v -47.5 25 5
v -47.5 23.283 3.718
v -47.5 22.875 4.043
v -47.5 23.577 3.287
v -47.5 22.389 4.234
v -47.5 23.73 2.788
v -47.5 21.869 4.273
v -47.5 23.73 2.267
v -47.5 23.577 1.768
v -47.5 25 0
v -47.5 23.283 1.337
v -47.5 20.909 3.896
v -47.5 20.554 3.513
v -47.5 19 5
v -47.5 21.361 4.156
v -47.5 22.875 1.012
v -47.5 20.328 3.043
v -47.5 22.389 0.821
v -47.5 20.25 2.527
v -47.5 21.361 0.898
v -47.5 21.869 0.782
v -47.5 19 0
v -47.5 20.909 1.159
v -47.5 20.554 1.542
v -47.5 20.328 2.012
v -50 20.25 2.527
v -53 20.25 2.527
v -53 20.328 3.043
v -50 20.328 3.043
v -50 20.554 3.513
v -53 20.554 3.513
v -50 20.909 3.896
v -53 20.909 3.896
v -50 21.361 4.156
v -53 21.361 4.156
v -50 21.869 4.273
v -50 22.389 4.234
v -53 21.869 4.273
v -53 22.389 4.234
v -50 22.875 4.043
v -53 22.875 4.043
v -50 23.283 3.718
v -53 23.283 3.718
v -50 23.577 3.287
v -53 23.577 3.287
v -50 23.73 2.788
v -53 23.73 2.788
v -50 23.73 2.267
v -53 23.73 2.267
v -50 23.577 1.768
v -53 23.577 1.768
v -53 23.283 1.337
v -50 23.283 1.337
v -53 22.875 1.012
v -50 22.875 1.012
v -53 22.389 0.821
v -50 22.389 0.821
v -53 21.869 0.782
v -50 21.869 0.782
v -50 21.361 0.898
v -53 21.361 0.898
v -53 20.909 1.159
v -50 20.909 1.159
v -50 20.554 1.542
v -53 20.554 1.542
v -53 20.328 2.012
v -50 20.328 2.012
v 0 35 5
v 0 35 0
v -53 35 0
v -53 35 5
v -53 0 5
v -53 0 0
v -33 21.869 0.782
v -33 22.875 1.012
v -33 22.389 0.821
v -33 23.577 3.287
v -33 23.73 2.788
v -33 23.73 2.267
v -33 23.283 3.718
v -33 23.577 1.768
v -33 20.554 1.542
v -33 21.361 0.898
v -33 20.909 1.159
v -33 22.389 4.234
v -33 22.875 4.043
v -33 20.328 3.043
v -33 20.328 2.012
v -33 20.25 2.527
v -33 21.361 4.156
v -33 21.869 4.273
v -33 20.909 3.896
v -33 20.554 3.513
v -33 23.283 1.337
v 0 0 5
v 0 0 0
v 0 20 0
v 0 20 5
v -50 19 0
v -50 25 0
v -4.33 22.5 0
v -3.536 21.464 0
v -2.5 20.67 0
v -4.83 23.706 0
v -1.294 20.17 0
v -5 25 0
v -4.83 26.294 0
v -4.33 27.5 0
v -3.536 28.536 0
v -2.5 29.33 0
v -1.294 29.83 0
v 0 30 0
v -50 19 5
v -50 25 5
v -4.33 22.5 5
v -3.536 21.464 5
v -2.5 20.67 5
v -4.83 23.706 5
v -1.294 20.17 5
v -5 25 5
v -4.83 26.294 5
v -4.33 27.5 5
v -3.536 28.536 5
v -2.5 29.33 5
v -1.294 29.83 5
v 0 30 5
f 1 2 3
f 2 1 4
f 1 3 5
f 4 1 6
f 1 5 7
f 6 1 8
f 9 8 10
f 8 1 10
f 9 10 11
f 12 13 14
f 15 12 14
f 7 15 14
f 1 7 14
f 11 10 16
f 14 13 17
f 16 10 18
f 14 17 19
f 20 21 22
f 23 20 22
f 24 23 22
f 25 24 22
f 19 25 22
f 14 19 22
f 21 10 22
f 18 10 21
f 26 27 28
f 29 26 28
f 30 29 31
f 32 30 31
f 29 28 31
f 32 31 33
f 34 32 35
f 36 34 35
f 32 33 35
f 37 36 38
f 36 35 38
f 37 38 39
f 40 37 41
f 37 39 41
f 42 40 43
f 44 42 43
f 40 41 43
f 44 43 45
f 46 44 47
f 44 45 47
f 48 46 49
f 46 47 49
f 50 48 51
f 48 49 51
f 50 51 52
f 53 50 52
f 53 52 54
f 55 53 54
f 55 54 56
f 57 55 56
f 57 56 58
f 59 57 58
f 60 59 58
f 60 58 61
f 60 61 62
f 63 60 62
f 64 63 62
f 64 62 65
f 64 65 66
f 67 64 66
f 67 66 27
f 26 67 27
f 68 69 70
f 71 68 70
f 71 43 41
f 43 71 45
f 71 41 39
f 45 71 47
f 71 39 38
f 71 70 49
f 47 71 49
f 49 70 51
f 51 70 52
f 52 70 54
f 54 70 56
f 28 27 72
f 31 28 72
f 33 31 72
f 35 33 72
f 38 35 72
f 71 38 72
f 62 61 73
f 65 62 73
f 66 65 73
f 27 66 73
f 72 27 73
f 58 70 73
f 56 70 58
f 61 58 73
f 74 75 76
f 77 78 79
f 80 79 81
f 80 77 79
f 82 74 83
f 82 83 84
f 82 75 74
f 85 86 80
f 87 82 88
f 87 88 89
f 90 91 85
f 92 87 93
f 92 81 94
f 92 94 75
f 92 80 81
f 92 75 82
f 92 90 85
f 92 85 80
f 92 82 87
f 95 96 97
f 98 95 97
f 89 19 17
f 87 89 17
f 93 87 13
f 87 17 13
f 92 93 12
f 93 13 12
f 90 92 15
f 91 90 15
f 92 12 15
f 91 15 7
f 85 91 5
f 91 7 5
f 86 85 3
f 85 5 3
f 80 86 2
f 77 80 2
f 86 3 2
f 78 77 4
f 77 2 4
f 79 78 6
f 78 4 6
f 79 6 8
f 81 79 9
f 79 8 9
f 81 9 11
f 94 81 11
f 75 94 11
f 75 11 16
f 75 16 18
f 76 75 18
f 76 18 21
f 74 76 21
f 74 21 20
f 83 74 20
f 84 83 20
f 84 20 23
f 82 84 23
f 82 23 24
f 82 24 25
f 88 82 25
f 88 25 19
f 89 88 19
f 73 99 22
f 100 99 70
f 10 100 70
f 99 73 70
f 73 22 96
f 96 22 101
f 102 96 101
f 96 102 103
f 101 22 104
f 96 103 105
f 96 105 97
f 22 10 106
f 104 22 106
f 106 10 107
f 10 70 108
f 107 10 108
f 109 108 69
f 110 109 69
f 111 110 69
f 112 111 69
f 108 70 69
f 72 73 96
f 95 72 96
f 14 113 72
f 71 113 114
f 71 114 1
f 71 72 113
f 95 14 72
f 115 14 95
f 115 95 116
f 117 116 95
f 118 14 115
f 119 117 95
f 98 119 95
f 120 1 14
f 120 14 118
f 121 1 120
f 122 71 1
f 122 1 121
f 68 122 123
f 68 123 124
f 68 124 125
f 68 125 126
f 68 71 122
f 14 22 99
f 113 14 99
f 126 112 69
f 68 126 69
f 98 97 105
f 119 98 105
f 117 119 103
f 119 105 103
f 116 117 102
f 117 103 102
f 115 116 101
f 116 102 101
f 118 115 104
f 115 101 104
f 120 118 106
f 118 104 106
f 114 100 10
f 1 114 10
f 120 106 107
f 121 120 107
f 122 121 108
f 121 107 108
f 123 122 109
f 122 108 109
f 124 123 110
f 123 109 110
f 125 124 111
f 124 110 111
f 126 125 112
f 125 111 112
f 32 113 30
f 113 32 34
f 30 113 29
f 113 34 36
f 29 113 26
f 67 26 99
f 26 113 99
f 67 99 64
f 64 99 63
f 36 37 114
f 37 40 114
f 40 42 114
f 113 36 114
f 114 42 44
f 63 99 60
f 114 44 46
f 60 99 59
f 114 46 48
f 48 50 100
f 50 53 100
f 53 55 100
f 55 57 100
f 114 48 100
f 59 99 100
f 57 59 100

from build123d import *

# Parameters (mm, degrees)
F0_W     = 3
F0_H     = 10
F0_H_2   = 3
F1_DEPTH = 5
F2_R     = 1.75
F3_DEPTH = 20
F4_DEPTH = 20


# Not quite as in the source:
# - a feature names something its author has since deleted; it is built from what else it names


with BuildPart() as f1:
    # F0 (on Top) → F1 (new body)
    with BuildSketch(Plane.XY):
        with BuildLine():
            Line((-5, 25), (-47.5, 25))
            Line((-47.5, 25), (-47.5, 22))
            Line((-47.5, 22), (-47.5, 19))
            Line((-47.5, 19), (-50, 19))
            Line((-50, 19), (-50, 0))
            Line((-50, 0), (0, 0))
            Line((0, 0), (0, 20))
            ThreePointArc((0, 20), (-3.5355339059, 21.4644660941), (-5, 25))
        make_face()
        Polygon((-50, 22), (-53, 22), (-53, 0), (-50, 0), (-50, 19), align=None)
        with Locations((-51.5, 30)):
            Rectangle(F0_W, F0_H)
        with Locations((-51.5, 23.5)):
            Rectangle(F0_W, F0_H_2)
        with BuildLine():
            Line((0, 35), (-50, 35))
            Line((-50, 35), (-50, 25))
            Line((-50, 25), (-47.5, 25))
            Line((-47.5, 25), (-5, 25))
            ThreePointArc((-5, 25), (-3.5355339059, 28.5355339059), (0, 30))
            Line((0, 30), (0, 35))
        make_face()
    extrude(amount=F1_DEPTH)

    # F2 (on face) → F3 (cut)
    with BuildSketch(Plane(origin=(-53, 0, 0), x_dir=(0, -1, 0), z_dir=(-1, 0, 0))):
        with Locations((-22, 2.5274456161)):
            Circle(F2_R)
    extrude(amount=-F3_DEPTH, mode=Mode.SUBTRACT)

    # F2 (on face) → F4 (cut)
    with BuildSketch(Plane(origin=(-53, 0, 0), x_dir=(0, -1, 0), z_dir=(-1, 0, 0))):
        with BuildLine():
            ThreePointArc((22, 4.2774456161), (20.25, 2.5274456161), (22, 0.7774456161))
            Line((22, 0.7774456161), (22, 2.5274456161))
            Line((22, 2.5274456161), (22, 4.2774456161))
        make_face()
        with BuildLine():
            ThreePointArc((22, 0.7774456161), (23.2361299407, 1.2887032015), (23.7499961, 2.5237510221))
            Line((23.7499961, 2.5237510221), (22, 2.5274456161))
            Line((22, 2.5274456161), (22, 0.7774456161))
        make_face()
        with BuildLine():
            Line((22, 2.5274456161), (23.7499961, 2.5237510221))
            ThreePointArc((23.7499961, 2.5237510221), (23.749999025, 2.5255983181), (23.75, 2.5274456161))
            ThreePointArc((23.75, 2.5274456161), (23.2374368671, 3.7648824831), (22, 4.2774456161))
            Line((22, 4.2774456161), (22, 2.5274456161))
        make_face()
    extrude(amount=-F4_DEPTH, mode=Mode.SUBTRACT)


solid = f1.part
